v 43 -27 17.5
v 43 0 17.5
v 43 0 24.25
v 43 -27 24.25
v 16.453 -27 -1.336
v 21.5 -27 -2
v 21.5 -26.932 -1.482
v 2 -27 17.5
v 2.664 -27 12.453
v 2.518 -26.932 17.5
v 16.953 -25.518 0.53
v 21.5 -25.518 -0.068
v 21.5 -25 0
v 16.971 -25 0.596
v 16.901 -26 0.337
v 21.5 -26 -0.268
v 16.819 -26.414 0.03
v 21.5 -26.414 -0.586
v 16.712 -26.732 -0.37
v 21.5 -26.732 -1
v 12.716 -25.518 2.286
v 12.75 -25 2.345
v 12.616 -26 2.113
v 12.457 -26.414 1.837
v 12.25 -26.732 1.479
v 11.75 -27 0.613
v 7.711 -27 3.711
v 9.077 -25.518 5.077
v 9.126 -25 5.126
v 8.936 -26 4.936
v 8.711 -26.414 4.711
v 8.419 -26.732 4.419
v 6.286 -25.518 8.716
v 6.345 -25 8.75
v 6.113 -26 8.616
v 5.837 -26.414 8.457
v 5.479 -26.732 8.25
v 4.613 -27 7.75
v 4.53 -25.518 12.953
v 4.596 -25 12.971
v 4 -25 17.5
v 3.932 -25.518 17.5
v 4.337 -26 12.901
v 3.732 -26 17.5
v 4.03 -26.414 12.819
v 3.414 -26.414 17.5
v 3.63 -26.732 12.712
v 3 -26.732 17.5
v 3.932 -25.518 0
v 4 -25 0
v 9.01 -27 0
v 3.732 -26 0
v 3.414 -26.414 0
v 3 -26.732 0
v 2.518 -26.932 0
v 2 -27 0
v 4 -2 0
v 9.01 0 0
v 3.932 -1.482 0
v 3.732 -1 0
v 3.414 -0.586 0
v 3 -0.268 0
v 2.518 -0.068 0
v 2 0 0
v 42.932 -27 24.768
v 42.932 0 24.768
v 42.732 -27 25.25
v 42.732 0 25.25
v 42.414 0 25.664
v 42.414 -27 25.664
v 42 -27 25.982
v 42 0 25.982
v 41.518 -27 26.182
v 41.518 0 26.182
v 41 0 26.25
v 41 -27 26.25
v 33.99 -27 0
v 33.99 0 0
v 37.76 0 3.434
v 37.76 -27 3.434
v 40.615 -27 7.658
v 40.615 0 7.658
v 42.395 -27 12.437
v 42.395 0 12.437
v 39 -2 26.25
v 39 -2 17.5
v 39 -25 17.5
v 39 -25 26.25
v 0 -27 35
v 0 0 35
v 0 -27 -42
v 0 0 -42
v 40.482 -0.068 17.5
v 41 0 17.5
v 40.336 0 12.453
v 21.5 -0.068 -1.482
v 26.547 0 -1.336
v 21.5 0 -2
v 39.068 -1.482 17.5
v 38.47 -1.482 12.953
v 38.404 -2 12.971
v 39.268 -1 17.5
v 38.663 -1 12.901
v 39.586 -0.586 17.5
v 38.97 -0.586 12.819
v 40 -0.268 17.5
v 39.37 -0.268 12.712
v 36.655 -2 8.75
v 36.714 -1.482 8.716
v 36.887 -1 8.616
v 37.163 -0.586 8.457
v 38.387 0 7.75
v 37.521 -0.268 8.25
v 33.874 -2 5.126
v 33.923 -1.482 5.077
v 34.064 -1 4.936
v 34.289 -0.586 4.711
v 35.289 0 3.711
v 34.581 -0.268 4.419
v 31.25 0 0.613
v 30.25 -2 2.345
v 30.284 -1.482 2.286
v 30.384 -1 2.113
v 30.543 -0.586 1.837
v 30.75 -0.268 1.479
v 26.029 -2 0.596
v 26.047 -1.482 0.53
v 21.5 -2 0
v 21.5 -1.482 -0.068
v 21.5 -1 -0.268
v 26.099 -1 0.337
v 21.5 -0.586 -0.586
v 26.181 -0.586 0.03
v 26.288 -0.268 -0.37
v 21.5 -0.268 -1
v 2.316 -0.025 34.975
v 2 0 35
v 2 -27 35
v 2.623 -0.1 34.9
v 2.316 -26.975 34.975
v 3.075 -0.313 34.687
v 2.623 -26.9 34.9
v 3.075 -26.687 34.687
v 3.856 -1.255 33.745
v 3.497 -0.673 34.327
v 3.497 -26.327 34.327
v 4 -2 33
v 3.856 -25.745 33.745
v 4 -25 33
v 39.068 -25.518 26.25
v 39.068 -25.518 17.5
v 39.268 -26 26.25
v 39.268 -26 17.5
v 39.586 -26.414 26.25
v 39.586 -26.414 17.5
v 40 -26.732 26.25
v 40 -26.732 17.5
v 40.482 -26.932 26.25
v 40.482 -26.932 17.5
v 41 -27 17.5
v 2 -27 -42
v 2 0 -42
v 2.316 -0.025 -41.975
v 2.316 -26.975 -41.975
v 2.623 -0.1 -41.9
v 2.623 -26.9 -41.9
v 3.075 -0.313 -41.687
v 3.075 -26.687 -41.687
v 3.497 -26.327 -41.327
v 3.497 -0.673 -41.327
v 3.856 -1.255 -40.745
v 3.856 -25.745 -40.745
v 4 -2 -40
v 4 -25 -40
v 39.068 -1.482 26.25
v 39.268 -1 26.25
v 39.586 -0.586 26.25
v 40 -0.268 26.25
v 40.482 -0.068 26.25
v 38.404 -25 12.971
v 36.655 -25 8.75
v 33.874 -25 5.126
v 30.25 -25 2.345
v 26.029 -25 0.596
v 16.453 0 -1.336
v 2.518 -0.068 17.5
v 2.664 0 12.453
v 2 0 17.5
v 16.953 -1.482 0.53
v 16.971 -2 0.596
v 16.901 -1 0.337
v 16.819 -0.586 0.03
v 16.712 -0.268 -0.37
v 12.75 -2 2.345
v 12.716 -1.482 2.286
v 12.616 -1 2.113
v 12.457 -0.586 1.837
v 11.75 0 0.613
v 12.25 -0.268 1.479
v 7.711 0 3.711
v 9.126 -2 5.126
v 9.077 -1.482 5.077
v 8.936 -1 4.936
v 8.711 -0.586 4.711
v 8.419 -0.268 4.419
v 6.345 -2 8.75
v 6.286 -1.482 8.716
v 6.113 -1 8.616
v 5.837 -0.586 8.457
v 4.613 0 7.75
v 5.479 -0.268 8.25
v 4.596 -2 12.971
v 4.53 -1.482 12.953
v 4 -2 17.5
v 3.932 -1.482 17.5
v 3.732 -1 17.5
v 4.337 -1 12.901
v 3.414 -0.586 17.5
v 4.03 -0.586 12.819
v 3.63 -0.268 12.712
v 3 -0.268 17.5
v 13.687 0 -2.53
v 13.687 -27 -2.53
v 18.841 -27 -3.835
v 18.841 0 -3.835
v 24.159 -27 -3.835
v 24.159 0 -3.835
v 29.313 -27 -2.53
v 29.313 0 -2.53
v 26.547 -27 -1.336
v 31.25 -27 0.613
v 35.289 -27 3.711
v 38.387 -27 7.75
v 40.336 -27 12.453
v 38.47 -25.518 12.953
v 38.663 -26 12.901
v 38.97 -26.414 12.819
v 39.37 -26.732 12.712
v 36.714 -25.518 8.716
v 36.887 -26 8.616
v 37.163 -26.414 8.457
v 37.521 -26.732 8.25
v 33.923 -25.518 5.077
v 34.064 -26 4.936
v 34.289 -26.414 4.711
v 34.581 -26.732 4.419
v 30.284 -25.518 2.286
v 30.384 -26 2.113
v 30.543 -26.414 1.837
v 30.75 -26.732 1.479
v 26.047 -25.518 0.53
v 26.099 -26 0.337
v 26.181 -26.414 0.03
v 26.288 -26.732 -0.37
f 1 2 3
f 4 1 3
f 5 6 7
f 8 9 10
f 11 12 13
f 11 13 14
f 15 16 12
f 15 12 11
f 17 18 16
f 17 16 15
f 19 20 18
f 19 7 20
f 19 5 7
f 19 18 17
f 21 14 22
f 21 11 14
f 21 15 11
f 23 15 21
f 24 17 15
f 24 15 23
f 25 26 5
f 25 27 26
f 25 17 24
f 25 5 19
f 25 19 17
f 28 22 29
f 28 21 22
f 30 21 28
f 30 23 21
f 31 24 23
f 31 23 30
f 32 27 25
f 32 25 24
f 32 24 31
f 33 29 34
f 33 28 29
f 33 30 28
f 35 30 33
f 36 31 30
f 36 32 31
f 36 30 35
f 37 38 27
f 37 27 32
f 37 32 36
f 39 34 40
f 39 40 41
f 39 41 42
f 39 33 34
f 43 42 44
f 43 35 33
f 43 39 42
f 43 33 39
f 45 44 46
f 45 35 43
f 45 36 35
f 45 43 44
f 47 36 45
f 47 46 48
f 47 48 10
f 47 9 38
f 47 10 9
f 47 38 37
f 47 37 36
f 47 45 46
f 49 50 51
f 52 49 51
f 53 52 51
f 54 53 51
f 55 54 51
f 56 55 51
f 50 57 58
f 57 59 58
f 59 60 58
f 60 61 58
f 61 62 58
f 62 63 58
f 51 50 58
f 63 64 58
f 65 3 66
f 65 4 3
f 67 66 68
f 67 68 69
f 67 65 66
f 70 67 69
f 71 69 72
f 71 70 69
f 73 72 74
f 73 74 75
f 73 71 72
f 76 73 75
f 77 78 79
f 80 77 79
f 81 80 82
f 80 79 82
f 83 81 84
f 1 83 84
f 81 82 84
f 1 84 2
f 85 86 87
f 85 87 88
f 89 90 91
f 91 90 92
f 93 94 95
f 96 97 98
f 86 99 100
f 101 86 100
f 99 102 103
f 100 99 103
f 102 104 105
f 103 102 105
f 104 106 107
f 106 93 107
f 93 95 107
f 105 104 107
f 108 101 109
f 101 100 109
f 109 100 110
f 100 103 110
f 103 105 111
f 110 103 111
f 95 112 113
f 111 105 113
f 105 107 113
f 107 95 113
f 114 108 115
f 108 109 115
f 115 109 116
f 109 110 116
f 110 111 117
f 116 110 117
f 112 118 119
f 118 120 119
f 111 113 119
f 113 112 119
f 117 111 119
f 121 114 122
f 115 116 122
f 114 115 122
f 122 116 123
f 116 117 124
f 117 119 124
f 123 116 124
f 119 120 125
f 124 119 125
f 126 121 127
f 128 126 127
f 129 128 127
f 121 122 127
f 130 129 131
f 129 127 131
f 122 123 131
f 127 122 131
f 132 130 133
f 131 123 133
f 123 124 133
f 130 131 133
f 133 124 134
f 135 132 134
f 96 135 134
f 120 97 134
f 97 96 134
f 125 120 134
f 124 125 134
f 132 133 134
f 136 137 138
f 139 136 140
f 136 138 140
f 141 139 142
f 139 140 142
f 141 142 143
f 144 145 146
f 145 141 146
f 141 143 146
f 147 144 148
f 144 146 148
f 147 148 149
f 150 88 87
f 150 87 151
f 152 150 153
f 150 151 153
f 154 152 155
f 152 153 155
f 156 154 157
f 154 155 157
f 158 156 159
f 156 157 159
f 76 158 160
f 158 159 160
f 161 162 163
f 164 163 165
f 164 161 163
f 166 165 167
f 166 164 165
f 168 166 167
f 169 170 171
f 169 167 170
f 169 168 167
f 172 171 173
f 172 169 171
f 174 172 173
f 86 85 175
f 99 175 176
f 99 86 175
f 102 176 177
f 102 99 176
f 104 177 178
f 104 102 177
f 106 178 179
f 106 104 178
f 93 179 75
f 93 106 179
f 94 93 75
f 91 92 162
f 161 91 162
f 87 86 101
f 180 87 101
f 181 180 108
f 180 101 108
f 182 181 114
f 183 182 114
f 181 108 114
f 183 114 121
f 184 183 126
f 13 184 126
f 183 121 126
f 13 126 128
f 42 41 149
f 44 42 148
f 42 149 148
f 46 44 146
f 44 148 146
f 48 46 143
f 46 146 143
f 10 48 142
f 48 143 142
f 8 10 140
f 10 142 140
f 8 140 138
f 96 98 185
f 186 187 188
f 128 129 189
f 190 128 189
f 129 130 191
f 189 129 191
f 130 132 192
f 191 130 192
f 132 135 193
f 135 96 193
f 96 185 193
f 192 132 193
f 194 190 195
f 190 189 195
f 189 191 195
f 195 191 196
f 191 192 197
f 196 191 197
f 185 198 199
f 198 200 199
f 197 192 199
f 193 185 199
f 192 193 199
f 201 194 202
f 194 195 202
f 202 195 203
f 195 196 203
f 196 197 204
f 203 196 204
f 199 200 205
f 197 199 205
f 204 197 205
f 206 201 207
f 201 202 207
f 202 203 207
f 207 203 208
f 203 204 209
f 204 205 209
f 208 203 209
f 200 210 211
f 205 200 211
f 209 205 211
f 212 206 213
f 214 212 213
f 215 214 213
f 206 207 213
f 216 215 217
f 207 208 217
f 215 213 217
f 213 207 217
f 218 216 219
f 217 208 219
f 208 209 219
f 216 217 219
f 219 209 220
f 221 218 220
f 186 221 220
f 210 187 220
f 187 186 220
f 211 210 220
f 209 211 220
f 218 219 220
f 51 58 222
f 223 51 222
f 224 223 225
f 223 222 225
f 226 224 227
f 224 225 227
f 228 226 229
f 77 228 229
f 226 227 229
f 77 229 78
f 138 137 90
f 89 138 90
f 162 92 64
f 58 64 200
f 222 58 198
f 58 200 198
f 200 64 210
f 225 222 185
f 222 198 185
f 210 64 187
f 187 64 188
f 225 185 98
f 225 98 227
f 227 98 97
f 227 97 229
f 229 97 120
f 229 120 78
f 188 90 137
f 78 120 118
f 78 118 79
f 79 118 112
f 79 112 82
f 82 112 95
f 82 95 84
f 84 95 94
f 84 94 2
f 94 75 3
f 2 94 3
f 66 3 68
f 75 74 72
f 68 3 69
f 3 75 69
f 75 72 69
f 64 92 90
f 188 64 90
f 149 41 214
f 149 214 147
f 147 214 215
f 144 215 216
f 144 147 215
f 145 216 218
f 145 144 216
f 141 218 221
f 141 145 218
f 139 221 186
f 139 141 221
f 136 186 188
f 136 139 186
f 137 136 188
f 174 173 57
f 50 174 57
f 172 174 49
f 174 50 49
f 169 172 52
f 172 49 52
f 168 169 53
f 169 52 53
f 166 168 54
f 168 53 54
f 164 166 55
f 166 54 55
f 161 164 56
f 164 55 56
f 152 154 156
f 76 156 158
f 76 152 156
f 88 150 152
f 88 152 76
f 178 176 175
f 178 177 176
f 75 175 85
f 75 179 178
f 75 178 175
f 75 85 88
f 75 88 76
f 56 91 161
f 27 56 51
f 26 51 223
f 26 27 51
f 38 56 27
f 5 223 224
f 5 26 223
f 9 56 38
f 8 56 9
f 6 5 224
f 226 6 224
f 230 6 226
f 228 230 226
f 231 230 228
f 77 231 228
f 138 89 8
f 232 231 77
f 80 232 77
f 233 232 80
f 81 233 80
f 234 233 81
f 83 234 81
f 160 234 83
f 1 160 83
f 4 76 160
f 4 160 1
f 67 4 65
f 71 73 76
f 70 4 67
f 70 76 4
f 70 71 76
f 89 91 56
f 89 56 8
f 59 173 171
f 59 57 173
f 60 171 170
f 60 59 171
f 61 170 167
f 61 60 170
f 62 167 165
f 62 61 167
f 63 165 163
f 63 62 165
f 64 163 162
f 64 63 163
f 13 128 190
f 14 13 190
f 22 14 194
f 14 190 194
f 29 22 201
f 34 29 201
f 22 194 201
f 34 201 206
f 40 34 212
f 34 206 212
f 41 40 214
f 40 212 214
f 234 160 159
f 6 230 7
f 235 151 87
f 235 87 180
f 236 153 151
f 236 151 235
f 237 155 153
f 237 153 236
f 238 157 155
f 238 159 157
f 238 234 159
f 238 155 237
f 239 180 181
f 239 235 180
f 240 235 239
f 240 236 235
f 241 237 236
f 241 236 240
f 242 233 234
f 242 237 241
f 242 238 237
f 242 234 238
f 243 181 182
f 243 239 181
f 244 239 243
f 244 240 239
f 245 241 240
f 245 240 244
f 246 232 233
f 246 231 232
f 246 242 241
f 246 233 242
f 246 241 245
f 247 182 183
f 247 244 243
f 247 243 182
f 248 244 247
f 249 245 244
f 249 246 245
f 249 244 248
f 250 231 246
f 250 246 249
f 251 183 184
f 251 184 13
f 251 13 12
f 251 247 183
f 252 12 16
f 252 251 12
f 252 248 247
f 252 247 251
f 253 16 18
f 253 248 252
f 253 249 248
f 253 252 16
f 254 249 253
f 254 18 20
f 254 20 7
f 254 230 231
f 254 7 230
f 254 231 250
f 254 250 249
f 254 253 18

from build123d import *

# Parameters (mm, degrees)
F1_W     = 4
F1_H     = 42
F1_H_2   = 8.75
F2_DEPTH = 27
F3_R     = 1.99999


# Not quite as in the source:
# - a fillet or chamfer is up to 0.001 mm smaller than in the source, because OpenCascade refuses the exact size


with BuildPart() as f2:
    # F1 (on Front) → F2 (new body)
    with BuildSketch(Plane.XZ):
        with BuildLine():
            Line((4, 35), (0, 35))
            Line((0, 35), (0, 17.5))
            ThreePointArc((0, 17.5), (1.0244047706, 24.0574385243), (4, 29.9899959968))
            Line((4, 29.9899959968), (4, 35))
        make_face()
        with BuildLine():
            ThreePointArc((4, 5.0100040032), (1.0244047706, 10.9425614757), (0, 17.5))
            Line((0, 17.5), (0, 0))
            Line((0, 0), (4, 0))
            Line((4, 0), (4, 5.0100040032))
        make_face()
        with BuildLine():
            Line((4, 17.5), (0, 17.5))
            ThreePointArc((0, 17.5), (1.0244047706, 10.9425614757), (4, 5.0100040032))
            Line((4, 5.0100040032), (4, 17.5))
        make_face()
        with BuildLine():
            ThreePointArc((4, 29.9899959968), (1.0244047706, 24.0574385243), (0, 17.5))
            Line((0, 17.5), (4, 17.5))
            Line((4, 17.5), (4, 29.9899959968))
        make_face()
        with Locations((2, -21)):
            Rectangle(F1_W, F1_H)
        with BuildLine():
            ThreePointArc((9.0100040032, 0), (6.2972042045, 2.2972042045), (4, 5.0100040032))
            Line((4, 5.0100040032), (4, 0))
            Line((4, 0), (9.0100040032, 0))
        make_face()
        with BuildLine():
            Line((4, 17.5), (4, 5.0100040032))
            ThreePointArc((4, 5.0100040032), (6.2972042045, 2.2972042045), (9.0100040032, 0))
            Line((9.0100040032, 0), (21.5, 0))
            ThreePointArc((21.5, 0), (9.1256313292, 5.1256313292), (4, 17.5))
        make_face()
        with BuildLine():
            Line((21.5, 0), (9.0100040032, 0))
            ThreePointArc((9.0100040032, 0), (21.5, -4), (33.9899959968, 0))
            Line((33.9899959968, 0), (21.5, 0))
        make_face()
        with BuildLine():
            ThreePointArc((39, 17.5), (33.8743686708, 5.1256313292), (21.5, 0))
            Line((21.5, 0), (33.9899959968, 0))
            ThreePointArc((33.9899959968, 0), (40.6152414833, 7.6583770122), (43, 17.5))
            Line((43, 17.5), (39, 17.5))
        make_face()
        with Locations((41, 21.875)):
            Rectangle(F1_W, F1_H_2)
    extrude(amount=F2_DEPTH)

    # F3 (radius 2 in the source; OpenCascade refuses exactly that, so slightly less here)
    f3_edges = [f2.edges().sort_by_distance(p)[0] for p in [
        (4, -27, -21),
        (4, -27, 26.25),
        (4, 0, -21),
        (4, -13.5, -42),
        (4, 0, 26.25),
        (43, -13.5, 26.25),
        (4, -13.5, 35),
    ]]
    fillet(f3_edges, radius=F3_R)


solid = f2.part
